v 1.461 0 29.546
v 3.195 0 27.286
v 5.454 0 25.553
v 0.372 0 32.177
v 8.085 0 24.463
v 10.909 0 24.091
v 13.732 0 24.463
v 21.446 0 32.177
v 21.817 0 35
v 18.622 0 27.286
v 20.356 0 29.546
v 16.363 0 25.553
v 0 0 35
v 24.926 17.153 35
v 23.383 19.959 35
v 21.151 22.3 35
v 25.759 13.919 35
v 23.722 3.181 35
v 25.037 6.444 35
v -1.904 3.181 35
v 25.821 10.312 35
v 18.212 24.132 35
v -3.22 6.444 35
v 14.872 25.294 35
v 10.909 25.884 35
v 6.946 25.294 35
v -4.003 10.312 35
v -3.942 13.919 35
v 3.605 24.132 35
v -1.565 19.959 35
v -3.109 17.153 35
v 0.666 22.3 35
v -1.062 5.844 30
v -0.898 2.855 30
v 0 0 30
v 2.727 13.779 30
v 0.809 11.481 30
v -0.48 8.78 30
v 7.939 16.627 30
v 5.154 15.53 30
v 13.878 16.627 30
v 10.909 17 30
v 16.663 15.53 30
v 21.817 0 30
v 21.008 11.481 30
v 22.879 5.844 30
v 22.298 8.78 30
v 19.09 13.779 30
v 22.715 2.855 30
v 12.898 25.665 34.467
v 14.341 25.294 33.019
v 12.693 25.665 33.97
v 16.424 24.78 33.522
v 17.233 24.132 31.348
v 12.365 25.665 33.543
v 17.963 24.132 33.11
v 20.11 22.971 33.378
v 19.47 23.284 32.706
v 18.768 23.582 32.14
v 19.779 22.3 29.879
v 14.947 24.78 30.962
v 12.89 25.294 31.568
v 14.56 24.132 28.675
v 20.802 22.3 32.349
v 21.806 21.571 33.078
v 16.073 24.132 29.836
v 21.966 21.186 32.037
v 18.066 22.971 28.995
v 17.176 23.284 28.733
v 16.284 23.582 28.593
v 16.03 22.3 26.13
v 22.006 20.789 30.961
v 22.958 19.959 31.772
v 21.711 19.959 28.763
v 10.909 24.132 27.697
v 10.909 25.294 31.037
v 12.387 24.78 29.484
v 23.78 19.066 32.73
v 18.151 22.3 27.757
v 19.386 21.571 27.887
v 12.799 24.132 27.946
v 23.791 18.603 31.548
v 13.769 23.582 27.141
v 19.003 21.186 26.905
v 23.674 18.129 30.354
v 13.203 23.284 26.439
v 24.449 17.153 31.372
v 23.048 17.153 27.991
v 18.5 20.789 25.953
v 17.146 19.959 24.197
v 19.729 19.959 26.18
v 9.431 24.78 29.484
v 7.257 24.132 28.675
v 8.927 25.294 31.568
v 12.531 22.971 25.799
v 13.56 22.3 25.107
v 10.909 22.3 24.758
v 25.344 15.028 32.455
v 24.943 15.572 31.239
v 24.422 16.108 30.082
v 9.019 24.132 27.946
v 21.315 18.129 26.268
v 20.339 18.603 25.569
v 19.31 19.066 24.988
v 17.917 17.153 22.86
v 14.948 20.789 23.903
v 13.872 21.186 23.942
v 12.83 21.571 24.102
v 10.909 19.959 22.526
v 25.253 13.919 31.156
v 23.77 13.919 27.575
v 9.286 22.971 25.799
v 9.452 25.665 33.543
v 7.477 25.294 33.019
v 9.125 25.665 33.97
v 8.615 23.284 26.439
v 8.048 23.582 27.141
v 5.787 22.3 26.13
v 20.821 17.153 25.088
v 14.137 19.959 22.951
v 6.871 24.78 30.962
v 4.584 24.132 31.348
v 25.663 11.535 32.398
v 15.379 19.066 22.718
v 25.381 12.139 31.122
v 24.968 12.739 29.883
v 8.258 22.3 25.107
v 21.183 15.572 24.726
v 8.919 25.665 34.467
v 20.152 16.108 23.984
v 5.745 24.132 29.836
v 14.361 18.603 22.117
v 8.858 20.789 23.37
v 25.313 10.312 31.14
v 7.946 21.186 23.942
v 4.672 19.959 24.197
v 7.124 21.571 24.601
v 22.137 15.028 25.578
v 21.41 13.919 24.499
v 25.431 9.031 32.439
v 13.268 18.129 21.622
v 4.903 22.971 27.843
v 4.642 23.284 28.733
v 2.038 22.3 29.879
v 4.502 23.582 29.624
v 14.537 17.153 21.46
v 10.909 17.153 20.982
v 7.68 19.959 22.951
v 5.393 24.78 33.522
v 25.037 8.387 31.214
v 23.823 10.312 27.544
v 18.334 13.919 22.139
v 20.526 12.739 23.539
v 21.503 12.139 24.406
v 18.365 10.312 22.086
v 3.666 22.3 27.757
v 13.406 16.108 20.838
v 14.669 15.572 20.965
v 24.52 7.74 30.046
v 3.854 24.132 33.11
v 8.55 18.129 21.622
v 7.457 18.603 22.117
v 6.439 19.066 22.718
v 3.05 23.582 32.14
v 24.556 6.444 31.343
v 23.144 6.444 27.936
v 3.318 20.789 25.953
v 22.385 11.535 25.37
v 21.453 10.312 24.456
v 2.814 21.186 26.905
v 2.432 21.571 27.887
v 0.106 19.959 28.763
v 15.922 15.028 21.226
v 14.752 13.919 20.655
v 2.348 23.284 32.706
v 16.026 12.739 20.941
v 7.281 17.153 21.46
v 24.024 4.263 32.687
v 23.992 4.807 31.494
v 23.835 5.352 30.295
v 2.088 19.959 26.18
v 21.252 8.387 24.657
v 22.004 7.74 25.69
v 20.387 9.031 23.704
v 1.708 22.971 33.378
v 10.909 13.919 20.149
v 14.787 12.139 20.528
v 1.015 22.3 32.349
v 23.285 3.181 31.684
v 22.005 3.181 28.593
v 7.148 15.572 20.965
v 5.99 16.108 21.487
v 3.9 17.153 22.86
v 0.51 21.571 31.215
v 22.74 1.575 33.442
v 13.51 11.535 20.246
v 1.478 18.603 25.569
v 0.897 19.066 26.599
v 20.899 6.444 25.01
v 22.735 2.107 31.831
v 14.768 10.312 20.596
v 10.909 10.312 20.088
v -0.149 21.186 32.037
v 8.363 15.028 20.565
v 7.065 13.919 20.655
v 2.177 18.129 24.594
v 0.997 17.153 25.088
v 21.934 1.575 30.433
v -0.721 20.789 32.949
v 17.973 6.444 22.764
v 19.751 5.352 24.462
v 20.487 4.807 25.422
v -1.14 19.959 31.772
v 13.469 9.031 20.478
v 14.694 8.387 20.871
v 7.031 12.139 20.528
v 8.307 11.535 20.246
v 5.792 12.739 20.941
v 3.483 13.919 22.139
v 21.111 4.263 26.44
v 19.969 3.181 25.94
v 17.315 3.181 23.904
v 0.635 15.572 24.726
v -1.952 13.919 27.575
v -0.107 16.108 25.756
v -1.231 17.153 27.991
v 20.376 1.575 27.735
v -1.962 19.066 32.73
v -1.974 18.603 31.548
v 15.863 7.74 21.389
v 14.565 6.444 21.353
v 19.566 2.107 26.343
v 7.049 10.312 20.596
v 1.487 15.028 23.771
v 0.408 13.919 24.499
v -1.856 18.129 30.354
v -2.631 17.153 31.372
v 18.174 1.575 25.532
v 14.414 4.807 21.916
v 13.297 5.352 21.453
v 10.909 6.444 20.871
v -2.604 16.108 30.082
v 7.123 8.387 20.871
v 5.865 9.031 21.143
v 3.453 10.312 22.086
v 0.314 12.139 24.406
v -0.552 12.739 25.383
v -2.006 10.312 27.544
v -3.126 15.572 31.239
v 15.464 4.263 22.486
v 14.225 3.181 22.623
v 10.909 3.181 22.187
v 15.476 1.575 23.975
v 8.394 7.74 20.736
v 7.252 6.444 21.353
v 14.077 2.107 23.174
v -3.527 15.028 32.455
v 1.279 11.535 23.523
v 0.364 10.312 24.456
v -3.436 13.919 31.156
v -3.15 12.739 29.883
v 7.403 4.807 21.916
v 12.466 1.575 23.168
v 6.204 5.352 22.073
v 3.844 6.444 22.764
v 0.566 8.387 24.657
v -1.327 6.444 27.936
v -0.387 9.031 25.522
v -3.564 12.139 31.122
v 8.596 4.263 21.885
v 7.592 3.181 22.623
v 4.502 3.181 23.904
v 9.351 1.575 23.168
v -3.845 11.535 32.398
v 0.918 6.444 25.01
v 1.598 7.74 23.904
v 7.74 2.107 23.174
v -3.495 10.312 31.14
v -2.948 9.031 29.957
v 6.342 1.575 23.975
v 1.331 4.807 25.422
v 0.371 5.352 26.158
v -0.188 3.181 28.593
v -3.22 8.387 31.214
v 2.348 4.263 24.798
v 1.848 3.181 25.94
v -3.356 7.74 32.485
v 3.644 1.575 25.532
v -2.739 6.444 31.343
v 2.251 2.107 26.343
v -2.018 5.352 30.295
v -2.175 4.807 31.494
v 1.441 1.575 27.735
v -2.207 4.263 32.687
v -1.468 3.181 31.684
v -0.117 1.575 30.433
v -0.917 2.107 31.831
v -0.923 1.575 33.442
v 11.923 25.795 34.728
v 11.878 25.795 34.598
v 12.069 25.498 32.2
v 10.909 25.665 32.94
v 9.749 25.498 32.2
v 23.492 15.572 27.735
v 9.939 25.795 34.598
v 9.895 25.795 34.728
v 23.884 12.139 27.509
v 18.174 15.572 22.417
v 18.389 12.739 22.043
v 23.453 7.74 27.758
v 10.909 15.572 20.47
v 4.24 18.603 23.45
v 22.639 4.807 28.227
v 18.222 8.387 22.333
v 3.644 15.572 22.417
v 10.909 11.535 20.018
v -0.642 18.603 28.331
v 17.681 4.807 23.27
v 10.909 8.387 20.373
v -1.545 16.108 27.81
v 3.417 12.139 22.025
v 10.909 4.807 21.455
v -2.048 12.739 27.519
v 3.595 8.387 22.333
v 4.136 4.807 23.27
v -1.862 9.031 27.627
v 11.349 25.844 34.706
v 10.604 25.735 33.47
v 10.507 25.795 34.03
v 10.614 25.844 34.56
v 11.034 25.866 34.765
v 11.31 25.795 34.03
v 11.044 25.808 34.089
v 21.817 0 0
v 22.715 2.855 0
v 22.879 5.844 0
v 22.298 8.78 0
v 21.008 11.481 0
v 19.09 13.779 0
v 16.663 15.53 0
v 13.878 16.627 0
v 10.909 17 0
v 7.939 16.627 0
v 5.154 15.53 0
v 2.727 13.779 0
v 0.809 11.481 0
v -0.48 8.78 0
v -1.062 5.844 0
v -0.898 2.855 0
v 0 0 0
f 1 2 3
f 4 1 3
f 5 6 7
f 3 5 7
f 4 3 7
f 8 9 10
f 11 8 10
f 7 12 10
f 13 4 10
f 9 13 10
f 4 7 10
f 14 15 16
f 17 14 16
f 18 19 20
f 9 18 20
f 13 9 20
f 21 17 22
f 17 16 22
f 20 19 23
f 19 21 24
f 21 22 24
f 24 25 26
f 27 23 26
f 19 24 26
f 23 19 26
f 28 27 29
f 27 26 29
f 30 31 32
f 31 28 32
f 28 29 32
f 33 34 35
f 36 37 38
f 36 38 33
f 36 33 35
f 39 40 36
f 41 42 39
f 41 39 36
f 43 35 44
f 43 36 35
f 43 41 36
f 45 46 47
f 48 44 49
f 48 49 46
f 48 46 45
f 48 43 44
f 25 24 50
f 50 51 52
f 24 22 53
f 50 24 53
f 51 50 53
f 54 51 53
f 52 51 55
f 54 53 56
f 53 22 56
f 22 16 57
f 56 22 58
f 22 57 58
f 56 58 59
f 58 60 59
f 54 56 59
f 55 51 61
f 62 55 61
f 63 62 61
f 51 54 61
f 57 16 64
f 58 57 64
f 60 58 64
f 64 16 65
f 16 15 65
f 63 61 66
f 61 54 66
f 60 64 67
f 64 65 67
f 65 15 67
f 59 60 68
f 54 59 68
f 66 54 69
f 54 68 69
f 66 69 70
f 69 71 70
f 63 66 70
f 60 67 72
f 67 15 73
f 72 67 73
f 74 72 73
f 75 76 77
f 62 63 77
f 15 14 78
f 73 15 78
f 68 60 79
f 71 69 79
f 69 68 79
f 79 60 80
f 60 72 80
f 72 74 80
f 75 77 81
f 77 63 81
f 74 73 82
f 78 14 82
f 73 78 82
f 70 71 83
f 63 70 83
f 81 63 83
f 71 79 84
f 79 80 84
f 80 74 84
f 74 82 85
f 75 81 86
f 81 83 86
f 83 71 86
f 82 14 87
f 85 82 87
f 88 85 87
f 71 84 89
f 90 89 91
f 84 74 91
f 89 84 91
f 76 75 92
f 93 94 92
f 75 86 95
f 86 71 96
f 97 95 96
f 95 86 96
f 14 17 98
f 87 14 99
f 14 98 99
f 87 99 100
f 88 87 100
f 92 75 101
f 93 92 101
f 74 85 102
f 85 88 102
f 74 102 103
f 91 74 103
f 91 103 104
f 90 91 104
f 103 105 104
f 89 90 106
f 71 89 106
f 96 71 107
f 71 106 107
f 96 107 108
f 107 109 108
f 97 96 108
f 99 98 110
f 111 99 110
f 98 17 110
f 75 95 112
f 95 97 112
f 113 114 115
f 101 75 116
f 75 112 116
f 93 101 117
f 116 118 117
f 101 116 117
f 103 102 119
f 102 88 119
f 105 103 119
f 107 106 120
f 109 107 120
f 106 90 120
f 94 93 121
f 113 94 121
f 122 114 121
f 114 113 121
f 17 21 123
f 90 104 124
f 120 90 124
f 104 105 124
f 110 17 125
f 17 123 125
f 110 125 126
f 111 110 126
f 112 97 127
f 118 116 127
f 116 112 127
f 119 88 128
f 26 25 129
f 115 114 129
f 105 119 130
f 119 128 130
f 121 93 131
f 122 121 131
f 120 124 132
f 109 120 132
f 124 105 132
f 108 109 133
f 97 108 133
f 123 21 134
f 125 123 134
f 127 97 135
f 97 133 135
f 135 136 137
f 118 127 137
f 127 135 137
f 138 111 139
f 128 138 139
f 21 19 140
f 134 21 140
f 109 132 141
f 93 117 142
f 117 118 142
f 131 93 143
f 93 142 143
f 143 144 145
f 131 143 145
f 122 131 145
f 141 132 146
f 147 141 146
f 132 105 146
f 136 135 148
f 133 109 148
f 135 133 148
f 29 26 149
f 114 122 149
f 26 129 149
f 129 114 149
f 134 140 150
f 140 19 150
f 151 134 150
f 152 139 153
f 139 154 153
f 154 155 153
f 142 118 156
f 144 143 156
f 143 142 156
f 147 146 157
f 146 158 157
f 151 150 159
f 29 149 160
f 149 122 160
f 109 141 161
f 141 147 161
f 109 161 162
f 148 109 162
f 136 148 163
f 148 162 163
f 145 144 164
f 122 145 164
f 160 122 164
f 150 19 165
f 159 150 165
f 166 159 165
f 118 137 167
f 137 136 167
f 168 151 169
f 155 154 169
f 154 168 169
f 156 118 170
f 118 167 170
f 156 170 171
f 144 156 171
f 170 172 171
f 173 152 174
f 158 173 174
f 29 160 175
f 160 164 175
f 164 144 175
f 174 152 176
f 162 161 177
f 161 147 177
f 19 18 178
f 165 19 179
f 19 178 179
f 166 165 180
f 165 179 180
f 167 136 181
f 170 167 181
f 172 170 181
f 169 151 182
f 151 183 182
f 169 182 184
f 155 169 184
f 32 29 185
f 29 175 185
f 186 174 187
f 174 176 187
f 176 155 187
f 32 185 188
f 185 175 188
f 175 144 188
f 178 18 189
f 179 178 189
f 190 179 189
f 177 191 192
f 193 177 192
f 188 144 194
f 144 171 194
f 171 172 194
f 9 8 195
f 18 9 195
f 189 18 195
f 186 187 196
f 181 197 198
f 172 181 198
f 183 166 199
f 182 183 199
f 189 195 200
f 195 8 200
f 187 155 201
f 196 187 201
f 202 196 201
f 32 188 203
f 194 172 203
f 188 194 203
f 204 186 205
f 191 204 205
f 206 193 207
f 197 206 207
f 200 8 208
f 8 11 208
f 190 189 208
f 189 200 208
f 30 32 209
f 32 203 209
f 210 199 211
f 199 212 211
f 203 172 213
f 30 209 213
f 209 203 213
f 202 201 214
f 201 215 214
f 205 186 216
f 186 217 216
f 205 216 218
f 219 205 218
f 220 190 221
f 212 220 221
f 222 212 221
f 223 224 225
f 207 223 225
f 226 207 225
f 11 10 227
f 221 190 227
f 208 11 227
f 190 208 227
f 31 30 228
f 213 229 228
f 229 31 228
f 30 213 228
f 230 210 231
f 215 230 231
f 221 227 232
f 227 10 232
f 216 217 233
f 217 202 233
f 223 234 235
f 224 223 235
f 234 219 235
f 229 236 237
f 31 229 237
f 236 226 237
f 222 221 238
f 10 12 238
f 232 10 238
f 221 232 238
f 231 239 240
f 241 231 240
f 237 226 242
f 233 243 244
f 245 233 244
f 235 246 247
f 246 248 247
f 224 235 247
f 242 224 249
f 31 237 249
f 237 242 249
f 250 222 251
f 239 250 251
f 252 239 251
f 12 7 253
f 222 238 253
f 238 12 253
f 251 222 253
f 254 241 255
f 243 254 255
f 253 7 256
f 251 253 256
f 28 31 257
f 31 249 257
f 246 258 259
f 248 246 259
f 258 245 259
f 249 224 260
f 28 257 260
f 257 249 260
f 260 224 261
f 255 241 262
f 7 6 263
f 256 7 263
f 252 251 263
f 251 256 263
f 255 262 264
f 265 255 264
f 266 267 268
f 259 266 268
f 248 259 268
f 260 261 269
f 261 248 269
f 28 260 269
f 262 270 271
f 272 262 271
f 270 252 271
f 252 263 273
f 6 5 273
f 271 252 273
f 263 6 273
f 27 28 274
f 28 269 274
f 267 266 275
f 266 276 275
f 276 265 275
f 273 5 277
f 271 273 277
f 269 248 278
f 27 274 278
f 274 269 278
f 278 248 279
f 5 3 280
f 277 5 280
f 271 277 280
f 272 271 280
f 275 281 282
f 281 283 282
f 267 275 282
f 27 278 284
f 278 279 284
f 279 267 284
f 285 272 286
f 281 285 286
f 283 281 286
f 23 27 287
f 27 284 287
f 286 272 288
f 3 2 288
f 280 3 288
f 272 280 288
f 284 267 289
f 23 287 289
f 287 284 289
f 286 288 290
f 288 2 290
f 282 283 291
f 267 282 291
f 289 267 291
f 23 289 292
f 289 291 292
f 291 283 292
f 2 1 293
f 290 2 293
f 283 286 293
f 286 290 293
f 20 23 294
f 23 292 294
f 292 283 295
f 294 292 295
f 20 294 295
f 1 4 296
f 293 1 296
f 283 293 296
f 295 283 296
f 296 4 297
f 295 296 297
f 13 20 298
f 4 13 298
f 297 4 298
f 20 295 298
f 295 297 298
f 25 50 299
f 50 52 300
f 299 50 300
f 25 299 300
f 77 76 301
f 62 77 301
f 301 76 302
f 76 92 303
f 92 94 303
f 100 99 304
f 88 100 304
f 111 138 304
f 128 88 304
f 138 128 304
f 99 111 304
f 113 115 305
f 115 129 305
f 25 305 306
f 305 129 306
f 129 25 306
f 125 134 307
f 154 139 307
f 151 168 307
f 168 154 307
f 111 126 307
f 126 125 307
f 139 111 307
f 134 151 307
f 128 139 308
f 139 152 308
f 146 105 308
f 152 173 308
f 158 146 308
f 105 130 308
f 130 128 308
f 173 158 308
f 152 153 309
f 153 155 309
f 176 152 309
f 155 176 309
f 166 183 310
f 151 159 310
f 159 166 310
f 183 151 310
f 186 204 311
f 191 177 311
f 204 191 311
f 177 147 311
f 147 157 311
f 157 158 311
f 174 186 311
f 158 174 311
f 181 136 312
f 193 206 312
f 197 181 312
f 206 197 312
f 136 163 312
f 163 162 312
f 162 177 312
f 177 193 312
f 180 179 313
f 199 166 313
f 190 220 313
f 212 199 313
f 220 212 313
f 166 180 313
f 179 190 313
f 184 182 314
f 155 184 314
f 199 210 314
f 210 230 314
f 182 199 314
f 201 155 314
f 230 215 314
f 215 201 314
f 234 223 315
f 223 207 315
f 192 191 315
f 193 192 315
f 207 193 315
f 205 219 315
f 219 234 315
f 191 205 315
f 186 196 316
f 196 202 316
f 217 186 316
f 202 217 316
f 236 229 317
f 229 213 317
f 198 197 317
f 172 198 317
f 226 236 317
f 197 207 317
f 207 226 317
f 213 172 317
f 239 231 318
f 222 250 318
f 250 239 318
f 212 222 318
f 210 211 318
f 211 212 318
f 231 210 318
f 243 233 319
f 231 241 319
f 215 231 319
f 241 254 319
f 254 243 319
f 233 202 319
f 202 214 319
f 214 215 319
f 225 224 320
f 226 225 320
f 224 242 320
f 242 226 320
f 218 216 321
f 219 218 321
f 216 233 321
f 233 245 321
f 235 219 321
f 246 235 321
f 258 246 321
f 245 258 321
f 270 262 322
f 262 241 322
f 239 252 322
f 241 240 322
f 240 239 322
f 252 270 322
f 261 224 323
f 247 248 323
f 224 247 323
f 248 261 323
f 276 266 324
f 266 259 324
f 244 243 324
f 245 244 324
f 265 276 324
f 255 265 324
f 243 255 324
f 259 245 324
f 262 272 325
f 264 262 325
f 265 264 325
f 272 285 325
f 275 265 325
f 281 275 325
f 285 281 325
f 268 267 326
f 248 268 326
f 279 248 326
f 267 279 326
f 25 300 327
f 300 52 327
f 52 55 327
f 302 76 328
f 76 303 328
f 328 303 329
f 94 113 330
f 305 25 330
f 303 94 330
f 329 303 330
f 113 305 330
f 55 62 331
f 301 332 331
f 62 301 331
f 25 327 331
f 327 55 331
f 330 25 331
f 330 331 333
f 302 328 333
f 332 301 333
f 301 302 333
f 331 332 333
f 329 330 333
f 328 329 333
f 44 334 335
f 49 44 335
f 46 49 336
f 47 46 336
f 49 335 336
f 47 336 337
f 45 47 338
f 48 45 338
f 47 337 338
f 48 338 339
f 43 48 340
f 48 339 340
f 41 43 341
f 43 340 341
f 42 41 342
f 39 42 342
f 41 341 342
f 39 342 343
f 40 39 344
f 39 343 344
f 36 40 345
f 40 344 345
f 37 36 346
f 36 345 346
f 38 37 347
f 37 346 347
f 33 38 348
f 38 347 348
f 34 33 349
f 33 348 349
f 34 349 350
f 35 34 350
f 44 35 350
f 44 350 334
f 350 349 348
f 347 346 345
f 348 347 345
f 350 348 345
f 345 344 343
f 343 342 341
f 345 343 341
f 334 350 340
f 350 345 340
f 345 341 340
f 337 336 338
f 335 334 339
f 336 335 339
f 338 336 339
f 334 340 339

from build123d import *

# Parameters (mm, degrees)
BOSS_EXTRUDE1_DEPTH = 30
REVOLVE1_ANGLE      = 180


with BuildPart() as part:
    # Sketch1 → Boss-Extrude1 (new body)
    with BuildSketch(Plane.XY):
        with BuildLine():
            Line((0, 0), (21.817424229, 0))
            ThreePointArc((21.817424229, 0), (10.908712115, 17), (0, 0))
        make_face()
    extrude(amount=BOSS_EXTRUDE1_DEPTH)


with BuildPart() as body_2:
    # Sketch4 → Revolve1 (revolve)
    with BuildSketch(Plane.XY.offset(35)):
        with BuildLine():
            Line((10.908712115, 0), (10.908712115, 25.884381417))
            add(Edge.make_bspline(
                [(10.908712115, 25.884381417), (26.541224025, 24.862355599), (29.516777115, 10.915057194), (21.817424229, 0)],
                knots=[0, 0, 0, 0, 1, 1, 1, 1], degree=3))
            Line((21.817424229, 0), (10.908712115, 0))
        make_face()
    revolve(axis=Axis((10.908712115, 0, 35), (0, 1, 0)), revolution_arc=REVOLVE1_ANGLE)


solid = Compound([part.part, body_2.part])
